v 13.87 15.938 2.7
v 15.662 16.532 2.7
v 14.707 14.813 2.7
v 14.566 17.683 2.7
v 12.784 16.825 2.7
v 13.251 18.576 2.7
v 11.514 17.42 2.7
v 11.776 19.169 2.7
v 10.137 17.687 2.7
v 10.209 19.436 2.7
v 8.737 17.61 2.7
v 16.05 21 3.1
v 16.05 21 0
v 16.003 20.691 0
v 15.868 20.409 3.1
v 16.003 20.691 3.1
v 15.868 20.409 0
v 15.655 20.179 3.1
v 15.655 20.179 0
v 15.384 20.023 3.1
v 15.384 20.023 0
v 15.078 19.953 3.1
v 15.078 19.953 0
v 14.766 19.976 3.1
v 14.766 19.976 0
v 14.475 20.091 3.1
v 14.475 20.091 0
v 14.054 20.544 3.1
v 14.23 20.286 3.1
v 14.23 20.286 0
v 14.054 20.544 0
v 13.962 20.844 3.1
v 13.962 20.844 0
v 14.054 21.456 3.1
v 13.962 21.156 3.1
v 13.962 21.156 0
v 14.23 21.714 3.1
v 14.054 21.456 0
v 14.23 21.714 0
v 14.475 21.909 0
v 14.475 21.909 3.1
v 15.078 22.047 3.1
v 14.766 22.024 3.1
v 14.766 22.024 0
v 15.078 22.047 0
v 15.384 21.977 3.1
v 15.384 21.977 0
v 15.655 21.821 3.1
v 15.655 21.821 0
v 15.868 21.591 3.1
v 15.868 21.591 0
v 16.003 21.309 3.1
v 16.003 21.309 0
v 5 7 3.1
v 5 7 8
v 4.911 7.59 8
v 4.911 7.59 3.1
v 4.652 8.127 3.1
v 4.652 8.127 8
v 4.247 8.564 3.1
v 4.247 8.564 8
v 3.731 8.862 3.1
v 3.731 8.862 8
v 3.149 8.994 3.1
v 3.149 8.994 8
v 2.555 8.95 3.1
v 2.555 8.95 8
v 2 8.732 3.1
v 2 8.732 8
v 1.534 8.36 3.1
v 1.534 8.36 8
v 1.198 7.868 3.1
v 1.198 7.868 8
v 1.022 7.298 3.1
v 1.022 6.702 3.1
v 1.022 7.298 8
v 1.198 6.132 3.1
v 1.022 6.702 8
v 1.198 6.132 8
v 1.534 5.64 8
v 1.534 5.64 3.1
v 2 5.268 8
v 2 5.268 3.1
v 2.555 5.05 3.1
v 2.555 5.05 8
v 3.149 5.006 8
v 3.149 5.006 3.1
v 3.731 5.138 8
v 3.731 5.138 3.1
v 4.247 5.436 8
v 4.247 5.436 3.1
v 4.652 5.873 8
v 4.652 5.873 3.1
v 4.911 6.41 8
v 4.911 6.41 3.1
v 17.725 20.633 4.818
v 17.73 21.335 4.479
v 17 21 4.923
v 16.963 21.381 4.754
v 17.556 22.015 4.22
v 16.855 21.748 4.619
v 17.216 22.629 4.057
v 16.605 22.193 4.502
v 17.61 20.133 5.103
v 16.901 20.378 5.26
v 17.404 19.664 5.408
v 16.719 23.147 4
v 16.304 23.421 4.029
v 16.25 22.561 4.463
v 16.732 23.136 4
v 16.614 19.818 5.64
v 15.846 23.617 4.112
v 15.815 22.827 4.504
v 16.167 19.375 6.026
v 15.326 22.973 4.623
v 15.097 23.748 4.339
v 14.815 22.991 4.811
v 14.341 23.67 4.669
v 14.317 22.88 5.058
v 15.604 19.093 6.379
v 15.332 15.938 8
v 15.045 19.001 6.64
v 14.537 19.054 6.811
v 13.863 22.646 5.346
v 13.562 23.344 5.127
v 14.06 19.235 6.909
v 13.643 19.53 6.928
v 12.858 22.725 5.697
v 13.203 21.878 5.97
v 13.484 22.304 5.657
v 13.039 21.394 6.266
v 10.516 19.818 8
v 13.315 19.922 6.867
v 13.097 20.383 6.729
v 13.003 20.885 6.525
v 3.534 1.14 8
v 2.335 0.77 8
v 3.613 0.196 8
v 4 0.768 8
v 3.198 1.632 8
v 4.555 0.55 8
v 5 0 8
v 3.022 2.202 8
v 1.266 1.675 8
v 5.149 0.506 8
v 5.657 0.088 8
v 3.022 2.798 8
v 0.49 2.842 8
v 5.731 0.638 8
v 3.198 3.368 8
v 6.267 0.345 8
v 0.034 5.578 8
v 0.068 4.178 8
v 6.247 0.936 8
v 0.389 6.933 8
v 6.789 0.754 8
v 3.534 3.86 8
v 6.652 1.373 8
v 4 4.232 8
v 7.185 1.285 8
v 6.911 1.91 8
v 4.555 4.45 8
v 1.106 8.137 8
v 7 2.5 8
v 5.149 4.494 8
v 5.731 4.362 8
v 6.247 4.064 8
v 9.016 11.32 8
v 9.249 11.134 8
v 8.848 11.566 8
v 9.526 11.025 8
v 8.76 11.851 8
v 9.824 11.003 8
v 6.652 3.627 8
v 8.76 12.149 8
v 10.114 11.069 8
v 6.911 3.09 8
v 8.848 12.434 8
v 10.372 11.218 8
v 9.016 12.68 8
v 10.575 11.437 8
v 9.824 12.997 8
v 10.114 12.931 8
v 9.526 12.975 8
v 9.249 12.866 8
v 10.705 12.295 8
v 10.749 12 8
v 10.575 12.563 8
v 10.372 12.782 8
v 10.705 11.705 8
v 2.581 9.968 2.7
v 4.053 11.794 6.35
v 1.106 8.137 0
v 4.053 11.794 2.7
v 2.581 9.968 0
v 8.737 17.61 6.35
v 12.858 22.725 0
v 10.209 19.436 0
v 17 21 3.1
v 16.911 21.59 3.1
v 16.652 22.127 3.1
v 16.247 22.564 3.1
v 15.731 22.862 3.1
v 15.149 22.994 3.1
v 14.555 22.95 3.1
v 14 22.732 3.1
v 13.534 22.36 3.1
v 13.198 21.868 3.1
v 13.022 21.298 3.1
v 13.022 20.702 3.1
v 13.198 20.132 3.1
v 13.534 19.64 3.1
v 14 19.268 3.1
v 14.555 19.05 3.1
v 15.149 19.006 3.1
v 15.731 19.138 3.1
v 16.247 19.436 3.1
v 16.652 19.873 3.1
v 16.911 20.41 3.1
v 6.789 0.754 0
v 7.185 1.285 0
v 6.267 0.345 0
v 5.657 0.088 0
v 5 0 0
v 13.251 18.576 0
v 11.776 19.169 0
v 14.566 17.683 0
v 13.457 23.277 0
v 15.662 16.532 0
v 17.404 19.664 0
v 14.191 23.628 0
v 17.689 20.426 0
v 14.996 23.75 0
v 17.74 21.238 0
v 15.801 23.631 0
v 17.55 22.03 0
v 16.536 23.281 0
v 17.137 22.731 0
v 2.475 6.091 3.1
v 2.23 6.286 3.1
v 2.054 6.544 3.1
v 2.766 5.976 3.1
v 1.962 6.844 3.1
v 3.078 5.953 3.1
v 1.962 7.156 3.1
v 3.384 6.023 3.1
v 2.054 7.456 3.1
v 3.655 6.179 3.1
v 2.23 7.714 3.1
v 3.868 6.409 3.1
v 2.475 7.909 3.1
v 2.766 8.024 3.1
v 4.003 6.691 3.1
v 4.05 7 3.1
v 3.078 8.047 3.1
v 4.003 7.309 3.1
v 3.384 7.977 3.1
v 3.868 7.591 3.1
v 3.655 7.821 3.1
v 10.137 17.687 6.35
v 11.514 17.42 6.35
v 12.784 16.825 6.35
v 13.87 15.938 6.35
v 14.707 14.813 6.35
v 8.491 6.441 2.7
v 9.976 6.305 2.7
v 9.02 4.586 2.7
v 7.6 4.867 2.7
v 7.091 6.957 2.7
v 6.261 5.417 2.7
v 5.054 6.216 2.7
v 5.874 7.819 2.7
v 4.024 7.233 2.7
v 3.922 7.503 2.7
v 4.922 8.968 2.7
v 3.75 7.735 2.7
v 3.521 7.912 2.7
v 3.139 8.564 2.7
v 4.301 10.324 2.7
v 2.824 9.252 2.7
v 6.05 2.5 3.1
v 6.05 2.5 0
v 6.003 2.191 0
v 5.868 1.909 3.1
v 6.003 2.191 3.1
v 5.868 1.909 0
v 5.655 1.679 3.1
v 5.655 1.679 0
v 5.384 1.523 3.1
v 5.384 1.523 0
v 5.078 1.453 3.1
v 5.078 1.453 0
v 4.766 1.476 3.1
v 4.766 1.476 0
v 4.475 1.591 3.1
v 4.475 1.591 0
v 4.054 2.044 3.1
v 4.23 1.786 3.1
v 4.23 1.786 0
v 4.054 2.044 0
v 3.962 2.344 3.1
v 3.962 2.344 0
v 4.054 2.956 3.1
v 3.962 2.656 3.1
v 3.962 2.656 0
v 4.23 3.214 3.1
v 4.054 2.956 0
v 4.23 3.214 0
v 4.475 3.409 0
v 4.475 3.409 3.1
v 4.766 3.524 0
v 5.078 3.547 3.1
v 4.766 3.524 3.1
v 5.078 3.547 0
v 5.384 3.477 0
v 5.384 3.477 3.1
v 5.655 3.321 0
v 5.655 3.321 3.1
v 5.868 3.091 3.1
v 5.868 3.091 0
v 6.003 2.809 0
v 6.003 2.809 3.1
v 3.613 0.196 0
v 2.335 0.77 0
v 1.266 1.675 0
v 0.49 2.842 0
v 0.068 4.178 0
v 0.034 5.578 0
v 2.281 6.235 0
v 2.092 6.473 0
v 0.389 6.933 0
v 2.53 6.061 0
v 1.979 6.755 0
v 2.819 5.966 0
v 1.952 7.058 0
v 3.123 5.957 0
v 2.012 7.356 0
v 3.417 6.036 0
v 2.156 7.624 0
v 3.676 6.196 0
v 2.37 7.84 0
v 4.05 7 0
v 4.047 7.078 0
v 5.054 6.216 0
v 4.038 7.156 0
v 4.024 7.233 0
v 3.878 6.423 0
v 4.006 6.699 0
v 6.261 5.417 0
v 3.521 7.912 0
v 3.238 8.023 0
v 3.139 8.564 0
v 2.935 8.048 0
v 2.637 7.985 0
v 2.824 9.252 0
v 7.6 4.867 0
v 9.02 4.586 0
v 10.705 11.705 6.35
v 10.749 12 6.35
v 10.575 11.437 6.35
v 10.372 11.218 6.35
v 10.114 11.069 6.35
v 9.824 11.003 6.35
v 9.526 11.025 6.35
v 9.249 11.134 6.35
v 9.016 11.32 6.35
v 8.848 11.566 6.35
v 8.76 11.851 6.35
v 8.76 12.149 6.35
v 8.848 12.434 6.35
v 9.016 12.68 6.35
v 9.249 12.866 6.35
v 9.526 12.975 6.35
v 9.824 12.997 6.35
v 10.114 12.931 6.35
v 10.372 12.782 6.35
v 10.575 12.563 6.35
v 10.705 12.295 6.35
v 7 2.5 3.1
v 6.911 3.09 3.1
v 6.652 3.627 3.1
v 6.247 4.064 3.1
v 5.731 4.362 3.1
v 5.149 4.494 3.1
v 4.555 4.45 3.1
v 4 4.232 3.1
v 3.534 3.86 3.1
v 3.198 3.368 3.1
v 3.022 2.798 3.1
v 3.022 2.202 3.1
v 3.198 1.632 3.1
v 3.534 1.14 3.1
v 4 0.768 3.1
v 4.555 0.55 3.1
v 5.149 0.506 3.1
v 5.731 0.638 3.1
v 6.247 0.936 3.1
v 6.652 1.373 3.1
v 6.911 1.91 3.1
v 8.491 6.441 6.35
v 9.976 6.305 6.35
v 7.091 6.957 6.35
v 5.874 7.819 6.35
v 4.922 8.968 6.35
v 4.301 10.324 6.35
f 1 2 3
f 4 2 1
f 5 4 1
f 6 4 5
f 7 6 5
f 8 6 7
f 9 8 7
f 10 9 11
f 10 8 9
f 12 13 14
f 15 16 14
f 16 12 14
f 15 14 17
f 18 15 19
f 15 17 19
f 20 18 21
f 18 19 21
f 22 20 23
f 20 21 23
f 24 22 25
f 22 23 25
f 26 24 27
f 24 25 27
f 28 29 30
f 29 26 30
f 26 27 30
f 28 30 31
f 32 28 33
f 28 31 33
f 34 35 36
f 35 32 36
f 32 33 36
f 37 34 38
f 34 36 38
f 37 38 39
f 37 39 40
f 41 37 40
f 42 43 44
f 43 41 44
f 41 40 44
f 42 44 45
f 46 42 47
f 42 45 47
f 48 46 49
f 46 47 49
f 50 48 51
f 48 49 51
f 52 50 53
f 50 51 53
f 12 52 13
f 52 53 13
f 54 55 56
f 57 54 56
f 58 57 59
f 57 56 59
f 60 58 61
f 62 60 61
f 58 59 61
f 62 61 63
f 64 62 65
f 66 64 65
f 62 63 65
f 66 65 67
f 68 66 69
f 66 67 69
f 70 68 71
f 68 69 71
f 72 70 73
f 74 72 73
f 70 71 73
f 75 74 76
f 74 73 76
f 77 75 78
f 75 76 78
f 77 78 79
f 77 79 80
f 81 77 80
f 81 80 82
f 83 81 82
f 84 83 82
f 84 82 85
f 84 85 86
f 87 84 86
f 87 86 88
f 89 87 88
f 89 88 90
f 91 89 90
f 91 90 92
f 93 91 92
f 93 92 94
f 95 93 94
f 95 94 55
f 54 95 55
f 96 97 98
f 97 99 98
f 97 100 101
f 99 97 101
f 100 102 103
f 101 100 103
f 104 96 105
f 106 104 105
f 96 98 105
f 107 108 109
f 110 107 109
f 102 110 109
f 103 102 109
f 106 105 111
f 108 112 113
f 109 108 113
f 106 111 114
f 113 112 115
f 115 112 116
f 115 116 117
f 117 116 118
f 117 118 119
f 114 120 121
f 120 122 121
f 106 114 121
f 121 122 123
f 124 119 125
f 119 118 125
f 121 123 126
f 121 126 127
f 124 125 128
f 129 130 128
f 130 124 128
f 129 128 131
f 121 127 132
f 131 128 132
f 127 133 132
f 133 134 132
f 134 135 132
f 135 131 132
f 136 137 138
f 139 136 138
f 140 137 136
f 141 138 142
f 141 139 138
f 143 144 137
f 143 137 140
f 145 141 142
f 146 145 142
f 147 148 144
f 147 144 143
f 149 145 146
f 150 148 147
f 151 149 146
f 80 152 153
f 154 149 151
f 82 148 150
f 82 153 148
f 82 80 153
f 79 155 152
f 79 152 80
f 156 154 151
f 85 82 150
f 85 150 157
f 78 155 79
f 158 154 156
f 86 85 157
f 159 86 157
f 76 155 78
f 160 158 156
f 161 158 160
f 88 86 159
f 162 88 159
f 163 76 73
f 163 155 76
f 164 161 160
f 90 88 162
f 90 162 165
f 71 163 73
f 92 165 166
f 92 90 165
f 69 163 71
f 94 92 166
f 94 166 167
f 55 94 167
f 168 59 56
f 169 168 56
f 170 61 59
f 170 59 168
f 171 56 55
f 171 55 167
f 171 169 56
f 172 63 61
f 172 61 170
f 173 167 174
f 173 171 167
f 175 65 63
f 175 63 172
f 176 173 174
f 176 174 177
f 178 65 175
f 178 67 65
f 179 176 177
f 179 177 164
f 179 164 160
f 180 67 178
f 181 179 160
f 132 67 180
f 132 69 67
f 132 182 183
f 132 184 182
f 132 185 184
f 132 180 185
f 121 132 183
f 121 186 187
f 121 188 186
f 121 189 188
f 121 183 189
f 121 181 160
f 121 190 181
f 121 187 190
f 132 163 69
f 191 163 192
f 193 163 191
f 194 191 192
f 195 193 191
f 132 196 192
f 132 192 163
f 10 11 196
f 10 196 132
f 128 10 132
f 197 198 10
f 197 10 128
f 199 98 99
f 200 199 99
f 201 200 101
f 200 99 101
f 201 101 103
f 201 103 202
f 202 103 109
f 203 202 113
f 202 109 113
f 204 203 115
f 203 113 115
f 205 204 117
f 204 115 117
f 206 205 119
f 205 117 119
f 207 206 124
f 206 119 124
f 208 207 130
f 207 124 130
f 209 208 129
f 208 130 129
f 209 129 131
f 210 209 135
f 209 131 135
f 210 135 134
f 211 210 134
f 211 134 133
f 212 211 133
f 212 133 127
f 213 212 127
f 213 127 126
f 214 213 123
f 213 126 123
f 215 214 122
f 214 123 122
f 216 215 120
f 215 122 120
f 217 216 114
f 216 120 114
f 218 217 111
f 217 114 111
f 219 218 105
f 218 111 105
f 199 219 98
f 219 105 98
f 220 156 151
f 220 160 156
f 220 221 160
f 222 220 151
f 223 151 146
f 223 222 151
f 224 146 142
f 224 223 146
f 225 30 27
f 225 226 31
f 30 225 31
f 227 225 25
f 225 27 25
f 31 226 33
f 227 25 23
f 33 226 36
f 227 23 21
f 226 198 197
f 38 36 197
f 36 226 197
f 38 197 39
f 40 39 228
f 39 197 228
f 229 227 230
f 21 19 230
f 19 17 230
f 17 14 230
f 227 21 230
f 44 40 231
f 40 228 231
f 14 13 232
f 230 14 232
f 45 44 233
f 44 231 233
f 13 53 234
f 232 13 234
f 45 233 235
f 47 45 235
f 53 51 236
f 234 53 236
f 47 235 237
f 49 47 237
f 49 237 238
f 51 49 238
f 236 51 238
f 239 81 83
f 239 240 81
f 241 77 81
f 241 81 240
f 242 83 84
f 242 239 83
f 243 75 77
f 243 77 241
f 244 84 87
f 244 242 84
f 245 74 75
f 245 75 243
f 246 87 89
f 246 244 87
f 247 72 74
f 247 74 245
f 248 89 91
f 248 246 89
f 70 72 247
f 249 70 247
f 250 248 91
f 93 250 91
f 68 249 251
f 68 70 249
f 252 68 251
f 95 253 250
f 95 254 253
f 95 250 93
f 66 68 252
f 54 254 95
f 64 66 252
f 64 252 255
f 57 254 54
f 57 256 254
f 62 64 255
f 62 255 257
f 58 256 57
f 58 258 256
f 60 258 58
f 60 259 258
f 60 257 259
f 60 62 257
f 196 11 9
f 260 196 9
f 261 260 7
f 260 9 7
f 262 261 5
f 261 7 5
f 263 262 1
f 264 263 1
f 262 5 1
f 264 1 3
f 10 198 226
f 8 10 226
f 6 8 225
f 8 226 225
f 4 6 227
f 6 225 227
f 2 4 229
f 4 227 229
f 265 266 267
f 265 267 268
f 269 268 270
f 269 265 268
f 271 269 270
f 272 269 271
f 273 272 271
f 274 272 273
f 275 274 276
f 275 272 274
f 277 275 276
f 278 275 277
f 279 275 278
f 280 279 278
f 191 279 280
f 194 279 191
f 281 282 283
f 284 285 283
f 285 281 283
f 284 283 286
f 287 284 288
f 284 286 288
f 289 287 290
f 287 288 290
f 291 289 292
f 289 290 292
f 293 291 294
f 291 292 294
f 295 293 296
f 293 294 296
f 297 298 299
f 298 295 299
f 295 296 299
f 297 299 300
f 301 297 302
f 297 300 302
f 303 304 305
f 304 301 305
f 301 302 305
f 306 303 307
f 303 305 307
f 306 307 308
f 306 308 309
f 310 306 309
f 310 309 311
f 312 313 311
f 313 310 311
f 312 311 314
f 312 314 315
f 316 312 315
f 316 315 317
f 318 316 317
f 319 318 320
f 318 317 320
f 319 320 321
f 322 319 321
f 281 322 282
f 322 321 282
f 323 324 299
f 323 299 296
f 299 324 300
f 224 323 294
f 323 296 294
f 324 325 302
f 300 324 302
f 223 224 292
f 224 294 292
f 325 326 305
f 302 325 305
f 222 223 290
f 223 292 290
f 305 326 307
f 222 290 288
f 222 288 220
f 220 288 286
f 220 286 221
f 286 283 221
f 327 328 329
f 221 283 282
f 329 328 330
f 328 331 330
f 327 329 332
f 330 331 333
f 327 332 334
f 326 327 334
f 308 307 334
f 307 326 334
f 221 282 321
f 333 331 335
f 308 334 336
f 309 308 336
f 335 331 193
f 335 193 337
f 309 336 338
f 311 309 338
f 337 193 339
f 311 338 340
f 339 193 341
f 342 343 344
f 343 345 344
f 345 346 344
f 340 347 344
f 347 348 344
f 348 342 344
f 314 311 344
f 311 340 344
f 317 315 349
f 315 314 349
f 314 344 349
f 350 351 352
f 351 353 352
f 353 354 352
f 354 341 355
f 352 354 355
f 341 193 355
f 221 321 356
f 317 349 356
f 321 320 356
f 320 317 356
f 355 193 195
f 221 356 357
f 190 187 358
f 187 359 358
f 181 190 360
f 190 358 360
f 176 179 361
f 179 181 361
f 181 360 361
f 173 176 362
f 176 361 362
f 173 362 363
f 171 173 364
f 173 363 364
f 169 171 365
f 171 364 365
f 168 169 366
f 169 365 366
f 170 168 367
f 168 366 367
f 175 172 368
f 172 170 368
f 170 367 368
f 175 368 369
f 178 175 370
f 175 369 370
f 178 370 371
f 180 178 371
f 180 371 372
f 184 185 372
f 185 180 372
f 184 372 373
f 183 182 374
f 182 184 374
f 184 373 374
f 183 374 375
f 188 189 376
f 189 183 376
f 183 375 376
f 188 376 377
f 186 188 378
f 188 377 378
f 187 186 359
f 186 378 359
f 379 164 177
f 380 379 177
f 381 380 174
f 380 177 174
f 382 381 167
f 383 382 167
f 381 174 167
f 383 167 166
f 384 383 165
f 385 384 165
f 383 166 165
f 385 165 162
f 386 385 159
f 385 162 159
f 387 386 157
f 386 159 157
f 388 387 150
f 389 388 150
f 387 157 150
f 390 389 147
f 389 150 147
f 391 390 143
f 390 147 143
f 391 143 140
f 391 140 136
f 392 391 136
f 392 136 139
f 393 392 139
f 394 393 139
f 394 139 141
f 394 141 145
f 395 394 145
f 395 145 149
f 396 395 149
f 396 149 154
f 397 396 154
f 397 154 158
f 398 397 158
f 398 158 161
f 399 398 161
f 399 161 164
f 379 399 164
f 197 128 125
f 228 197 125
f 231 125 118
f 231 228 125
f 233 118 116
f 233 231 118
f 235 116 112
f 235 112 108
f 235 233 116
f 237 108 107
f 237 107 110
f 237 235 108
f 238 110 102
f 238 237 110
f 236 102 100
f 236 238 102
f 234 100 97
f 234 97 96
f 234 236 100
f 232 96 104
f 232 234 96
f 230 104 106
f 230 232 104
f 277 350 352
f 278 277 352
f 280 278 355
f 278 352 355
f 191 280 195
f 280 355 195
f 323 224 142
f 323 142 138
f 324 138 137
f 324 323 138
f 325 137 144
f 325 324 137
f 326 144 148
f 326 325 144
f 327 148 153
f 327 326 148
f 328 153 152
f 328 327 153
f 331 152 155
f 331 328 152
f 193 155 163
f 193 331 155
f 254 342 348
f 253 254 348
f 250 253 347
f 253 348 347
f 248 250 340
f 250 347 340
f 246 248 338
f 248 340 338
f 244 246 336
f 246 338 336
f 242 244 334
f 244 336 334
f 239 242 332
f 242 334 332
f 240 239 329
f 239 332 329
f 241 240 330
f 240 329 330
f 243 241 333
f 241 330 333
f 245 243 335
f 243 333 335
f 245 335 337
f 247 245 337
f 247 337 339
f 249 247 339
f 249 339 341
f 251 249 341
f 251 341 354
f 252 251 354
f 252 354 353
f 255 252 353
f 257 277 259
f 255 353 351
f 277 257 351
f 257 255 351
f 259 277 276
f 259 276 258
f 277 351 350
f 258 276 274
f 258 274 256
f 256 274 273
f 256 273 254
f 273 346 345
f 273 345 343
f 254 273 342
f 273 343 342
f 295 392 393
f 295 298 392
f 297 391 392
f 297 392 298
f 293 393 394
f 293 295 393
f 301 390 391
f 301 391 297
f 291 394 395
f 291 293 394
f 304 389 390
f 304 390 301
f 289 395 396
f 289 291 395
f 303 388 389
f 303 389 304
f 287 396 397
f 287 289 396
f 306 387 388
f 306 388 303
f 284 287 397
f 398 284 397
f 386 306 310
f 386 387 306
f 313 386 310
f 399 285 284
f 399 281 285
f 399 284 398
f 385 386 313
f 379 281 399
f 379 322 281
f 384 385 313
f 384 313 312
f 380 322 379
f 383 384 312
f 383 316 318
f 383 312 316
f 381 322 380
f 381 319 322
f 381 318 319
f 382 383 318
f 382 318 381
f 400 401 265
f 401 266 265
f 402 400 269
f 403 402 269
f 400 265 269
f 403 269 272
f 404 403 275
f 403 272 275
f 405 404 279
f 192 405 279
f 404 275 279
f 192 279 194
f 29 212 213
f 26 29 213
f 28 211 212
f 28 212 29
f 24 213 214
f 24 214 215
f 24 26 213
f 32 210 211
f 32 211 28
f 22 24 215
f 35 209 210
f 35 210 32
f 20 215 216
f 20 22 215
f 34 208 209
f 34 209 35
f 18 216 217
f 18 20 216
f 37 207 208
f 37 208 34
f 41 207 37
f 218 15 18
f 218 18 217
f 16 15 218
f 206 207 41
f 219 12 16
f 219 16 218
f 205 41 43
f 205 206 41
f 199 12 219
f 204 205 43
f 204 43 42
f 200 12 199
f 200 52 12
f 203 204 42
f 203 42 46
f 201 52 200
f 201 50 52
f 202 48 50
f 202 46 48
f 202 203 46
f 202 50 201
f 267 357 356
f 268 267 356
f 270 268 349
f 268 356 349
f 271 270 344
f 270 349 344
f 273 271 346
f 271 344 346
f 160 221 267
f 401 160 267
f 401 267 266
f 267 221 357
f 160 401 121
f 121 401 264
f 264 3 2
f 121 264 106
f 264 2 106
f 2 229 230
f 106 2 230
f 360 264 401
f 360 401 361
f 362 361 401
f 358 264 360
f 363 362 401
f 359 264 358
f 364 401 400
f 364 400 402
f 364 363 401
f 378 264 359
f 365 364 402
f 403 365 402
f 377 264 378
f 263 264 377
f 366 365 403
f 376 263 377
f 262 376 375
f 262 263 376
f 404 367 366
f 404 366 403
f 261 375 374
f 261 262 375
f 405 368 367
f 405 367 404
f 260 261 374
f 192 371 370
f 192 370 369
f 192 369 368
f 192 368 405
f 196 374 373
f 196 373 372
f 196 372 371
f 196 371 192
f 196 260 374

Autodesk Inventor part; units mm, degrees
ref_plane "YZ Plane" through (0, 0, 0) normal (1, 0, 0) x (0, 1, 0)
ref_plane "XZ Plane" through (0, 0, 0) normal (0, 1, 0) x (-1, 0, 0)
ref_plane "XY Plane" through (0, 0, 0) normal (0, 0, 1) x (1, 0, 0)
sketch "Sketch1" plane through (0, 0, 0) normal (0, 0, 1) x (1, 0, 0)
  line L0 (0, 0) -> (18, 0)
  line L1 (18, 0) -> (18, 24)
  line L2 (18, 24) -> (0, 24)
  line L3 (0, 24) -> (0, 0)
  circle A0 centre (15, 21) radius 1.05
  circle A1 centre (5, 2.5) radius 1.05
  circle A2 centre (3, 7) radius 1.05
  line L4 (0, 10) -> (11.3137, 10) construction
  line L5 (6, 0) -> (28.3492, 0) construction
  line L6 (6, 0) -> (42, 0) construction
  circle A3 centre (9.749, 12) radius 1
  circle A4 centre (15, 21) radius 2.75
  circle A5 centre (5, 5) radius 5
  line L7 (1.1063, 8.1367) -> (12.8585, 22.7252)
  circle A6 centre (5, 2.5) radius 2.5
  line L8 (7.185, 1.2851) -> (17.4035, 19.6637)
  point P0 (8, 24)
  point P1 (18, 31.1769)
  point P2 (9.5257, 2.8745)
  point P3 (17.4892, 19.831)
  point P4 (5, 0)
  dimension "d0" = 18
  dimension "d1" = 24
  dimension "d2" = 2.1
  dimension "d3" = 3
  dimension "d4" = 3
  dimension "d5" = 2.1
  dimension "d6" = 2.1
  dimension "d7" = 2.5
  dimension "d8" = 5
  dimension "d9" = 3
  dimension "d10" = 7
  dimension "d12" = 10
  dimension "d15" = 6
  dimension "d18" = 2
  dimension "d25" = 5.5
  dimension "d26" = 10
  dimension "d30" = 12
  dimension "d31" = 8.251
extrude "Extrusion1" add sketch "Sketch1" along normal blind 8 contours A5 L8 A6 | A6 | L7 A4 L8 A5 | A4 picked at (5.8937, 6.9979)
sketch "Sketch3" plane through (0, 0, 0) normal (0, 0, -1) x (-1, 0, 0)
  circle A0 centre (-9.749, 12) radius 1 projected
  circle A1 centre (-9.749, 12) radius 7.45
  point P0 (0, 0)
  dimension "d27" = 14.9
extrude "Extrusion2" cut sketch "Sketch3" against normal blind 2.7
sketch "Sketch5" plane through (0, 0, 8) normal (0, 0, 1) x (1, 0, 0)
  circle A0 centre (3, 7) radius 1.05 projected
  circle A1 centre (5, 2.5) radius 1.05 projected
  circle A2 centre (15, 21) radius 1.05 projected
  circle A3 centre (3, 7) radius 2
  circle A4 centre (5, 2.5) radius 2
  circle A5 centre (15, 21) radius 2
  point P0 (0, 0)
  dimension "d32" = 4
  dimension "d33" = 4
  dimension "d34" = 4
extrude "Extrusion3" cut sketch "Sketch5" against normal blind 4.9
sketch "Sketch6" plane through (0, 0, 2.7) normal (0, 0, -1) x (-1, 0, 0)
  circle A0 centre (-9.749, 12) radius 1 projected
  circle A1 centre (-9.749, 12) radius 1 projected
  circle A2 centre (-9.749, 12) radius 5.7
  point P0 (0, 0)
  dimension "d37" = 11.4
extrude "Extrusion4" cut sketch "Sketch6" against normal blind 3.65
sketch "Sketch8" plane through (1.1063, 8.1367, 0) normal (-0.778745, 0.6273406, 0) x (0, 0, 1)
  line L0 (0, 21.4833) -> (8, 21.4833) projected
  line L1 (8, 18.7333) -> (8, 0) projected
  line L2 (8, 18.7333) -> (8, 21.4833) projected
  line L3 (4, 21.4833) -> (8, 15)
  line L4 (8, -1.5222) -> (8, 19.2005) projected
  point P0 (0, -7.0304)
  point P1 (8, 15)
extrude "Extrusion5" cut sketch "Sketch8" against normal up to surface surface through (7.185, 1.2851, 0) normal (0.8739914, -0.4859413, 0)
properties part number "PartD_3D"
